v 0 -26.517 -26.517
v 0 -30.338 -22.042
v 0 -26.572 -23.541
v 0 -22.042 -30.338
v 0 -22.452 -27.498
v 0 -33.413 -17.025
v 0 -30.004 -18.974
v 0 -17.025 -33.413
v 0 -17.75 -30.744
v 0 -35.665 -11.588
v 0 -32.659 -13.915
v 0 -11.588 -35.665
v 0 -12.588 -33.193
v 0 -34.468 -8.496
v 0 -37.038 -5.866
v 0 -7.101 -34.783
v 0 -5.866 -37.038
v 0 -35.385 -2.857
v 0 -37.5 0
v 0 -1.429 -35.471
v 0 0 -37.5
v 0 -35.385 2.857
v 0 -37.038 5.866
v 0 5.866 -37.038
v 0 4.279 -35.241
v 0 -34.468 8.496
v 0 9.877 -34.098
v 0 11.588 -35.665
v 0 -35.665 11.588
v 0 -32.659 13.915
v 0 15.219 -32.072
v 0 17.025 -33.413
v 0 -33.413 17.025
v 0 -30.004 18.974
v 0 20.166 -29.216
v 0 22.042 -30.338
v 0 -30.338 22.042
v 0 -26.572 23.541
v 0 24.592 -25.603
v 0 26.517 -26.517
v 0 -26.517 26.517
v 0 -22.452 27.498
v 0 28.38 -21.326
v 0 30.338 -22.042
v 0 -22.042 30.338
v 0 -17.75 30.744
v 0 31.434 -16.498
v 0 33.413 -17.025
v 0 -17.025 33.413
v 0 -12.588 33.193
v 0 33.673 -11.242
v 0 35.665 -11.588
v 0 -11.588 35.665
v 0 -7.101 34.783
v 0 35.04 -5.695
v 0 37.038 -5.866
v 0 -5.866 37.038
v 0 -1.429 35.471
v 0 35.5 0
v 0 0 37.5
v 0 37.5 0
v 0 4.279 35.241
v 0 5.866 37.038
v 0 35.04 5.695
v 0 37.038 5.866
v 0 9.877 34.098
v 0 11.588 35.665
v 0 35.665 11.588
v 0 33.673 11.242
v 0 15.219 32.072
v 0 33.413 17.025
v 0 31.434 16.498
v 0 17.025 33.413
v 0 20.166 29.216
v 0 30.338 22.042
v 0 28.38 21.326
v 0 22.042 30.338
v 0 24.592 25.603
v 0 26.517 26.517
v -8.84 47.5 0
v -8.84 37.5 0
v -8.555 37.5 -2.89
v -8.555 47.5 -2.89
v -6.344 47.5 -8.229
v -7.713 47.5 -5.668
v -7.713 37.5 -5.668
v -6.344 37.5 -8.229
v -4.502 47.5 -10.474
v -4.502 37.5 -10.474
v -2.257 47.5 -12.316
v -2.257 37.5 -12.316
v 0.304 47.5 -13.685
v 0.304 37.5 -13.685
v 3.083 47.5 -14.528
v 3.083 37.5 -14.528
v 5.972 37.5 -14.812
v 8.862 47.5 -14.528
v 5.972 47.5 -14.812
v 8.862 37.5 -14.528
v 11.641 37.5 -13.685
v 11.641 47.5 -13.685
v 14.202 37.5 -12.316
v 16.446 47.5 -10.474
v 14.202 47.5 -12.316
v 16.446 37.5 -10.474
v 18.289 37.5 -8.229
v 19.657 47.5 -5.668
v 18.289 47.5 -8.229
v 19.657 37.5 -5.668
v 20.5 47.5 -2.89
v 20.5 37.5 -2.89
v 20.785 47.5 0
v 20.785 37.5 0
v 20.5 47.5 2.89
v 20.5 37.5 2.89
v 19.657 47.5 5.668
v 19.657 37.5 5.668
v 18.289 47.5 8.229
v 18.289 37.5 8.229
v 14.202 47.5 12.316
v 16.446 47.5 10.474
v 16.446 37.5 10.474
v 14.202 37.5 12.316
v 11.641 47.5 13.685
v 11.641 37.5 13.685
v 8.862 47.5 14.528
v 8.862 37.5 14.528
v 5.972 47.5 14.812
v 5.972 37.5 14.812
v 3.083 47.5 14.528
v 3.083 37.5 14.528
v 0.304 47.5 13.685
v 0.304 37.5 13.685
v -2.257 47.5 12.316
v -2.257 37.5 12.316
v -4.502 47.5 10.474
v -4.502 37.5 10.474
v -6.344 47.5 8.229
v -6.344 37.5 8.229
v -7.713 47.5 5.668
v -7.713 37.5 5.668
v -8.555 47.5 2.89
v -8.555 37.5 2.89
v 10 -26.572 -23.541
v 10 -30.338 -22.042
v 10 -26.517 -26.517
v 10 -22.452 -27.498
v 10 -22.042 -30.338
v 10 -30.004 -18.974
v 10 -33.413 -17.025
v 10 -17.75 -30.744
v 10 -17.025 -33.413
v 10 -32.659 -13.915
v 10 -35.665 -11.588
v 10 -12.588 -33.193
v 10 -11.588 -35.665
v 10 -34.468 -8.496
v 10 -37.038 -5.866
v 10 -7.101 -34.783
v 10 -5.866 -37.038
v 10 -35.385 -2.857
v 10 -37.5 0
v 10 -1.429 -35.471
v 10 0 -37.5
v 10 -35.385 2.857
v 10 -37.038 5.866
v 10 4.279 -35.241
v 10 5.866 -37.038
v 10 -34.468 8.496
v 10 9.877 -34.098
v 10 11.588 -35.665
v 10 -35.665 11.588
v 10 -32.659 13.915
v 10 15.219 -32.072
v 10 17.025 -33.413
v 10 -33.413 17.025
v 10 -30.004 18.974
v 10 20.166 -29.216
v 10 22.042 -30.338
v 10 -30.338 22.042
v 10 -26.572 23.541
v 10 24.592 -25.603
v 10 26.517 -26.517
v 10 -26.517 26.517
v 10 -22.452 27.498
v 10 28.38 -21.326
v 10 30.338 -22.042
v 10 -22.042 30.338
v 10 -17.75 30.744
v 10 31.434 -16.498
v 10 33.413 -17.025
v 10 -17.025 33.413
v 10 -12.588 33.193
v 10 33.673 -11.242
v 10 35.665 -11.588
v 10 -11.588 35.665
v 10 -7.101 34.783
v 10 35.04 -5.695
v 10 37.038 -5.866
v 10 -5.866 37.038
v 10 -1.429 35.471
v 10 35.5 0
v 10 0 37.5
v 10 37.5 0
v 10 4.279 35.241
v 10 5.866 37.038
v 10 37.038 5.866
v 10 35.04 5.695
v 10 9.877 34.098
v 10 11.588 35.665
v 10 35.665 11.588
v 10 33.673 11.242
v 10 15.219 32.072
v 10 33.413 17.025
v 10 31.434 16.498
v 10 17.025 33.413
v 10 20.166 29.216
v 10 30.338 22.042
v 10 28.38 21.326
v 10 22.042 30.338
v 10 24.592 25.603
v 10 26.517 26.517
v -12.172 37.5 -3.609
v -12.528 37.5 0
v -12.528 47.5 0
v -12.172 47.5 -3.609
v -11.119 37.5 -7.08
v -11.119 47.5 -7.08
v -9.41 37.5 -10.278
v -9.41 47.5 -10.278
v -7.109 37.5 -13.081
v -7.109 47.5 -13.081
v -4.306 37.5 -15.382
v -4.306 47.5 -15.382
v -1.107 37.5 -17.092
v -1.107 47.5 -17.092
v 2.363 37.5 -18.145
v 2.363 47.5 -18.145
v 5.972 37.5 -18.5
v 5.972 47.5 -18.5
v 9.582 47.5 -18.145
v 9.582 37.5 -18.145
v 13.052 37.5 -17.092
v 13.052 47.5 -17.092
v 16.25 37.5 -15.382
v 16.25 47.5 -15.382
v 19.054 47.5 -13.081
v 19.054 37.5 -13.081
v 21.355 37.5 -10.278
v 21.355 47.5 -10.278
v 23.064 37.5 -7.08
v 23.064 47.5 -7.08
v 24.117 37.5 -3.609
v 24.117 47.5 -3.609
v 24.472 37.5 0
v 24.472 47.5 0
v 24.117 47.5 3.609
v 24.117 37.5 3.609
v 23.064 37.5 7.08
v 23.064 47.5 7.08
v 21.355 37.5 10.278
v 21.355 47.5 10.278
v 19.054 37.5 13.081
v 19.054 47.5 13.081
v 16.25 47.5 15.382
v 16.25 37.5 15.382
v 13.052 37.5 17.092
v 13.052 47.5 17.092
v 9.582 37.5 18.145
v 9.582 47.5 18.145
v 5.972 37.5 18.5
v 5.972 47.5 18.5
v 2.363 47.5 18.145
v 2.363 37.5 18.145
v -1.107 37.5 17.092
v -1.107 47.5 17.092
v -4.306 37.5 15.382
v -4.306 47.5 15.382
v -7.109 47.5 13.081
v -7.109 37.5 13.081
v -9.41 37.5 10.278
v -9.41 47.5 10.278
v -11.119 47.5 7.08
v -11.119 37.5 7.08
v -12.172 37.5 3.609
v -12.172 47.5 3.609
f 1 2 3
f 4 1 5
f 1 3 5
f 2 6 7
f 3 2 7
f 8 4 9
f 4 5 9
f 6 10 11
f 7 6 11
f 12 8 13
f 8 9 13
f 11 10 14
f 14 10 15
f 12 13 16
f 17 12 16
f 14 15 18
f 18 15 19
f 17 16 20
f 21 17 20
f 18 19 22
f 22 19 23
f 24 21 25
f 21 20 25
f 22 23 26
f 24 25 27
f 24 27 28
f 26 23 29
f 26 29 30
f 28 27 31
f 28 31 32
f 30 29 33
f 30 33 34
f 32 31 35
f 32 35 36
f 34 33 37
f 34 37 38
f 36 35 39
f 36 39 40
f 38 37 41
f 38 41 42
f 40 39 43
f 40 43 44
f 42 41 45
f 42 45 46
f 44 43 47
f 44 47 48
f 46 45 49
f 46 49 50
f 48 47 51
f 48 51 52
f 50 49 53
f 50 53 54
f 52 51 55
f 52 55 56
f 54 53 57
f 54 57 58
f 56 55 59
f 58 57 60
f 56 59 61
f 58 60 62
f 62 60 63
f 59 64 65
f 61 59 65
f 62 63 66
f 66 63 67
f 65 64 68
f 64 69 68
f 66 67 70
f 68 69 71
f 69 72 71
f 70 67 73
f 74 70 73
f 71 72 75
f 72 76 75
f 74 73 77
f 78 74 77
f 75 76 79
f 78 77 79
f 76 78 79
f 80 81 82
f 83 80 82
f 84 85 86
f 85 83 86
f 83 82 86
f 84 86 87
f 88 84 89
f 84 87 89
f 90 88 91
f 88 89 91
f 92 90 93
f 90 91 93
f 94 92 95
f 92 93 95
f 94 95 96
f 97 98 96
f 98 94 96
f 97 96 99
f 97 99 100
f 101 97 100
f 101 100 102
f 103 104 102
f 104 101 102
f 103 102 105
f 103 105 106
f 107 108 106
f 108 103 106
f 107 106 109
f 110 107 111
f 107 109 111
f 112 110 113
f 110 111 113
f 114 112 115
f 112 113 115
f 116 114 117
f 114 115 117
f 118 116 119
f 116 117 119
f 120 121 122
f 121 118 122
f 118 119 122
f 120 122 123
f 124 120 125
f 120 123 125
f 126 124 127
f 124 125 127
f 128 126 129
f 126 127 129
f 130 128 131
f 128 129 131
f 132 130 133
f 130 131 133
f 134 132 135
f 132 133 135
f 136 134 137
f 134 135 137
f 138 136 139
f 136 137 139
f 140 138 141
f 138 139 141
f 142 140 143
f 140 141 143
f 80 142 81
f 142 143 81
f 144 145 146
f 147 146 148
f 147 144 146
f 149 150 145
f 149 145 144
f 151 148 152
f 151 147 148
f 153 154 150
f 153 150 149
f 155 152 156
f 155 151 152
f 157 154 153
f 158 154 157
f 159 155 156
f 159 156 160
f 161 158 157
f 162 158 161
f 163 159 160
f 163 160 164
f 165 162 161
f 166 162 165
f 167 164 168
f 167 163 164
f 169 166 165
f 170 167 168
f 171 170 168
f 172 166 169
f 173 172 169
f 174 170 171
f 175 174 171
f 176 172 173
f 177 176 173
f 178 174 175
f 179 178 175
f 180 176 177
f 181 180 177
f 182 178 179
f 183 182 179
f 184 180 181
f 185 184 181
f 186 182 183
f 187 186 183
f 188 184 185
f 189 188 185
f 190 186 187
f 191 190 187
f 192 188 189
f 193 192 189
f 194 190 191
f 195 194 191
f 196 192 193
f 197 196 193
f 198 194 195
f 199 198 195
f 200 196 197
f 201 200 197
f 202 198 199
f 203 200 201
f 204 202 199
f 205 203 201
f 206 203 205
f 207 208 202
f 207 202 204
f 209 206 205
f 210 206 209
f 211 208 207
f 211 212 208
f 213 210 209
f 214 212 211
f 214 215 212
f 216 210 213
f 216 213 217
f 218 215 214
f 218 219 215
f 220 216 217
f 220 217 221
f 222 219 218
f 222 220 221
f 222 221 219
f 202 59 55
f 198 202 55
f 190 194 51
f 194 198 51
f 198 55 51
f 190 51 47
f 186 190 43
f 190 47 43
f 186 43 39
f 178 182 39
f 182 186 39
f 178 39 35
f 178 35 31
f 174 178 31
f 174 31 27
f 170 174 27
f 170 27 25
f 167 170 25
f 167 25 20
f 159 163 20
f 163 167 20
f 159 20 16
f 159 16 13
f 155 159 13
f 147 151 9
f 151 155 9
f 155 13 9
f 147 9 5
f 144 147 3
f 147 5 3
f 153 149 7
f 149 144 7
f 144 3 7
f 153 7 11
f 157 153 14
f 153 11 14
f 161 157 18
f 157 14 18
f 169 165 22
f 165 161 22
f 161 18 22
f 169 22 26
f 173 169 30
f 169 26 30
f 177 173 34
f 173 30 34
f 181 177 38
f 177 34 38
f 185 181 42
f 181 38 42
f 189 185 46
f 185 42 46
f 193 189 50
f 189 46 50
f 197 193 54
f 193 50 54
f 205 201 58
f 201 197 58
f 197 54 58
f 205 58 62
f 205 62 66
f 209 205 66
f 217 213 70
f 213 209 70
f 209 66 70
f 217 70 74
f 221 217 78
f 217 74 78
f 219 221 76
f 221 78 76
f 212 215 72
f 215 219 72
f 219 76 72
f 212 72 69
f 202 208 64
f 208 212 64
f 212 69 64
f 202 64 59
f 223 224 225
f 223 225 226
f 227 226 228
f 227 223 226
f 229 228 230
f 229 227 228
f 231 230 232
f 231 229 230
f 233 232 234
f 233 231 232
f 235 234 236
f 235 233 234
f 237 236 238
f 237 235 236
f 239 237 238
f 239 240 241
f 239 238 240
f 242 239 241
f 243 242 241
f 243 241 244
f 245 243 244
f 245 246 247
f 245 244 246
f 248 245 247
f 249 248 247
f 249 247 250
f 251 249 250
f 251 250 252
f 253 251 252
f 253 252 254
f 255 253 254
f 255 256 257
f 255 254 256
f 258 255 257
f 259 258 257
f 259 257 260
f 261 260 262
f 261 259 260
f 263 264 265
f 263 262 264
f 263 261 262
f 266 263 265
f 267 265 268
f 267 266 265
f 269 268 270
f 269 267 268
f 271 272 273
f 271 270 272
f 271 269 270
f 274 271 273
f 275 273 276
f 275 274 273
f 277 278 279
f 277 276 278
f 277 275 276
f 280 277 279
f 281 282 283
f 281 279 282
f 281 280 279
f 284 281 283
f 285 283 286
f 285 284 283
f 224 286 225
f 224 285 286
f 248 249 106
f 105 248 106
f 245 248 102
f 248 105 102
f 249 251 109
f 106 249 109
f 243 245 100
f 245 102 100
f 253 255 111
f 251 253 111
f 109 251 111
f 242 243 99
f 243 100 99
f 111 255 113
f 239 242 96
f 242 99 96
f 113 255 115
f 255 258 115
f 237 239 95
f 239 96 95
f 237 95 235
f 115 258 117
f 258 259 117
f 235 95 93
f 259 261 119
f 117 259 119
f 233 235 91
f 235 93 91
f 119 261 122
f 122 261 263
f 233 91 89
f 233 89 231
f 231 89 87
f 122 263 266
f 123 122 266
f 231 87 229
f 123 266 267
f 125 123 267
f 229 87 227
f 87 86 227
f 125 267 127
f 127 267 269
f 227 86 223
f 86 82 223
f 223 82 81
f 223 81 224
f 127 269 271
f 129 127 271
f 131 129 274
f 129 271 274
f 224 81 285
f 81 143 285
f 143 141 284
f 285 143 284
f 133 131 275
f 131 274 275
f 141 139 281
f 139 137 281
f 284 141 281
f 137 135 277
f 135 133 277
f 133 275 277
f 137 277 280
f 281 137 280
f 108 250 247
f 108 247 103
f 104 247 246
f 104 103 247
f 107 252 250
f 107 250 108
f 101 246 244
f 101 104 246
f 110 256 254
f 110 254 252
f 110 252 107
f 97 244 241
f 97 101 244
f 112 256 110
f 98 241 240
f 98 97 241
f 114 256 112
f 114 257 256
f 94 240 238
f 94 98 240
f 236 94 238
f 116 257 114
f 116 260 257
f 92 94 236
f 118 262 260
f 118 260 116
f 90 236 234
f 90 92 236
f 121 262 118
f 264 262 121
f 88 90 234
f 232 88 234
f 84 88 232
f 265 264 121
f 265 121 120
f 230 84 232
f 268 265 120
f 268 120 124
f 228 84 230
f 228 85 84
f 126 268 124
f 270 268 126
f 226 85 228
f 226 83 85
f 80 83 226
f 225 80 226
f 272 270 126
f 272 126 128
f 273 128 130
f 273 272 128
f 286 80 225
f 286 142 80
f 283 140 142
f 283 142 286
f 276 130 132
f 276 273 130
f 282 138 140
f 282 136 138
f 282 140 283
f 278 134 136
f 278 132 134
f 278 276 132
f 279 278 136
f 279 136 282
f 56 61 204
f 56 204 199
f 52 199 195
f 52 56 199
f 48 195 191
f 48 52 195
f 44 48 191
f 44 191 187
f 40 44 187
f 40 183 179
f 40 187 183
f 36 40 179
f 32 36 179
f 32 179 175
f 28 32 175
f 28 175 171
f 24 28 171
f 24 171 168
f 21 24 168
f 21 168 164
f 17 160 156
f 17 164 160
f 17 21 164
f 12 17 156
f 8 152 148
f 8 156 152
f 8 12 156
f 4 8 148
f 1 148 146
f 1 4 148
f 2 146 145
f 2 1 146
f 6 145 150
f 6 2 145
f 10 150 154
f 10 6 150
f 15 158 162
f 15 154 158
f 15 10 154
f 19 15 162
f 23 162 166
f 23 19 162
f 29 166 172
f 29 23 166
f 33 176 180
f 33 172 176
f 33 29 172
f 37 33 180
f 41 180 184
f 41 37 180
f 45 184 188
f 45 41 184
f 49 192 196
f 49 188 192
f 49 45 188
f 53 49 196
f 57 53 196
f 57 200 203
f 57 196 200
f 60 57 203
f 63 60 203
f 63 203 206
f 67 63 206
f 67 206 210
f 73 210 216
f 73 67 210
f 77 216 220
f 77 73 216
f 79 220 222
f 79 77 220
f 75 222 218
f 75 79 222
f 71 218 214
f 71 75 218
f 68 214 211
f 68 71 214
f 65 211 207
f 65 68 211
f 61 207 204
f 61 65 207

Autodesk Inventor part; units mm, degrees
ref_plane "YZ Plane" through (0, 0, 0) normal (1, 0, 0) x (0, 1, 0)
ref_plane "XY Plane" through (0, 0, 0) normal (0, 0, 1) x (1, 0, 0)
sketch "Sketch1" plane through (0, 0, 0) normal (1, 0, 0) x (0, 1, 0)
  circle A0 centre (0, 0) radius 37.5
  circle A1 centre (0, 0) radius 35.5
  dimension "d0" = 75
  dimension "d1" = 71
extrude "Extrusion1" add sketch "Sketch1" along normal blind 10
sketch "Sketch2" plane through (0, 0, 0) normal (0, 1, 0) x (-1, 0, 0)
  point P0 (0, 0)
ref_plane "Work Plane1" through (0, 37.5, 0) normal (0, 1, 0) x (-1, 0, 0)
sketch "Sketch3" plane through (0, 0, 0) normal (-1, 0, 0) x (0, 0, 1)
  point P0 (0, 0)
sketch "Sketch4" plane through (0, 37.5, 0) normal (0, 1, 0) x (-1, 0, 0)
  circle A0 centre (-5.9724, 0) radius 18.5
  circle A1 centre (-5.9724, 0) radius 14.8125
  point P0 (0, 0)
  dimension "d6" = 37
  dimension "d7" = 29.625
extrude "Extrusion2" add sketch "Sketch4" along normal blind 10
properties part number "Dc catcher"
